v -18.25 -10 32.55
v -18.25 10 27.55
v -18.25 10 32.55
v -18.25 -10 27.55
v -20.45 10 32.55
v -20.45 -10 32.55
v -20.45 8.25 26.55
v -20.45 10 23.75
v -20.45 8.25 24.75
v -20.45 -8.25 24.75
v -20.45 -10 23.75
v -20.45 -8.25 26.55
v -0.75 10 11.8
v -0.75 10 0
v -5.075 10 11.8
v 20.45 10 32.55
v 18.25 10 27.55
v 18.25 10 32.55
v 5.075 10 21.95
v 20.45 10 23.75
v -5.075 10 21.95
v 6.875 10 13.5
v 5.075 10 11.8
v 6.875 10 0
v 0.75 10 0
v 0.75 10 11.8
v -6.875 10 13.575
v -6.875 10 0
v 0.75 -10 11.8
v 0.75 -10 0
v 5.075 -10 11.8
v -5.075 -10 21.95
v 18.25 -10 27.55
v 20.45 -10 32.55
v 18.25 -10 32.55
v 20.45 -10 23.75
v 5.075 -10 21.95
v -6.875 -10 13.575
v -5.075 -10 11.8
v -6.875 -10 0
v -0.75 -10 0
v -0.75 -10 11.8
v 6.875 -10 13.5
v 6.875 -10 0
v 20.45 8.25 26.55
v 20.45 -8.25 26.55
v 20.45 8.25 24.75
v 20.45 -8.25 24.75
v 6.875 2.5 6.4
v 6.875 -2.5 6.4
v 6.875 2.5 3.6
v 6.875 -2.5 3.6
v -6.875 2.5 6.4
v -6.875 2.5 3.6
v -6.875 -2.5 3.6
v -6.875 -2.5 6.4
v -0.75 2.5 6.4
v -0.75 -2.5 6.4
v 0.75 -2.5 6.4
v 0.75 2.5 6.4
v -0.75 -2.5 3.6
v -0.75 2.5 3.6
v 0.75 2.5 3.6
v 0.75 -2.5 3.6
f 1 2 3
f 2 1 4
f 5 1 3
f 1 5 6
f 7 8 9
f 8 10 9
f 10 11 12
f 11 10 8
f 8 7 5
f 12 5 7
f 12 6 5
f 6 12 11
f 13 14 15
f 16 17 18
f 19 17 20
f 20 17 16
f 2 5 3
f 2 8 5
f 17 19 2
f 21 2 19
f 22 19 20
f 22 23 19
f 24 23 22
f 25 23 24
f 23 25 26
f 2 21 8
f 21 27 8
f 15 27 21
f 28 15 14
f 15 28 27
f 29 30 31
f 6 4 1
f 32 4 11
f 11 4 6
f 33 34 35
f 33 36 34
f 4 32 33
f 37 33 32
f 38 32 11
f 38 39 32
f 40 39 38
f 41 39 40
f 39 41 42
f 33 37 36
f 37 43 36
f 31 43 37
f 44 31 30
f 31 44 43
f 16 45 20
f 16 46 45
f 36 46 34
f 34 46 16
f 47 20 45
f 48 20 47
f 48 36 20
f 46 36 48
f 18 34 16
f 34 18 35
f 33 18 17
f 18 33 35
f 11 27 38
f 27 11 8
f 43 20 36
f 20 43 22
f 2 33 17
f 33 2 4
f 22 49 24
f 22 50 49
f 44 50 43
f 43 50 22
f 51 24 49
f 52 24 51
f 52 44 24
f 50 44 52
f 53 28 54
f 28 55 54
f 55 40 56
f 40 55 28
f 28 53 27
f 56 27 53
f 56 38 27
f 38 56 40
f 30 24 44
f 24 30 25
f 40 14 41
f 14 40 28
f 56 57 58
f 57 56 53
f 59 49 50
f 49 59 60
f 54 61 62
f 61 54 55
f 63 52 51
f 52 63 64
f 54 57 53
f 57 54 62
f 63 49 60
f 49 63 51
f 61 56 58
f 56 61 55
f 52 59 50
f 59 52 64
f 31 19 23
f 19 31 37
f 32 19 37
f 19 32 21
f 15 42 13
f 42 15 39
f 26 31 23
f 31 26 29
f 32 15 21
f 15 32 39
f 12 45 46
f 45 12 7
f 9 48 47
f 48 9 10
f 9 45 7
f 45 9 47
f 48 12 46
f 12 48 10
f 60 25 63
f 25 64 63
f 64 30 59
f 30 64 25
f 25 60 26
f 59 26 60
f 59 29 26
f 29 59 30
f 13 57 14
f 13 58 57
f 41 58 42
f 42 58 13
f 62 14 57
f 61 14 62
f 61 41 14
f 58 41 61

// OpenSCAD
// ===================================================================
// Project: OpenStickFPV
// Component: Modular 2200mAh 3S Battery Saddle Mount (Print 2x: Front & Rear)
// - Fits standard 2200mAh 3S LiPo packs (~34-36mm wide; pocket set to 36.5mm)
// - 5.0mm tall side retaining walls keep the battery centered and prevent
//   lateral sliding during rolls and rough landings
// - Recessed Velcro battery strap pass-through slot underneath the tray
//   so the battery strap wraps cleanly around the pack & tray without
//   interfering with the 10x10mm carbon spar underneath
// - Spar Attachment: Mounts to 10x10mm carbon fiber spar using the same
//   flush 10mm upper extension with lateral zip-tie slot & compression slit
// - 20.0mm fore-aft length along the carbon rod (print 2 identical units)
// - Print Orientation: Print sideways (front or rear face flat on build plate)
//   for 100% support-free 3D printing
// ===================================================================

$fn = 50;

// --- Fuselage Spar Spec (10x10mm Square) ---
spar_width           = 10.15;  // 10x10mm spar (+0.15mm printer tolerance)
spar_height          = 10.15;  // 10x10mm spar height
sleeve_wall          = 1.8;    // Structural collar wall thickness
mount_length         = 20.0;   // Fore-aft length along the carbon rod (Y-axis)

// --- Zip-Tie Clamping System (Matches Landing Gear & Wing Mounts) ---
clamp_rise           = 10.0;   // Extension from collar for zip-tie slot
ziptie_slot_w        = 5.0;    // Slot width along fuselage (fits up to 4.8mm ties)
ziptie_slot_h        = 2.8;    // Slot vertical clearance (Z-axis)
pinch_slit_w         = 1.5;    // Longitudinal compression slit

// --- 2200mAh 3S Battery Tray & Side Walls ---
// Standard 2200mAh 3S LiPo is ~34-35mm wide; 36.5mm gives a snug fit with foam/velcro
battery_pocket_w     = 36.5;   // Clear inner width between side walls (X-axis)
side_wall_thick      = 2.2;    // Thickness of left/right retaining walls
side_wall_height     = 5.0;    // 5.0mm tall side walls to prevent battery sliding out
tray_floor_thick     = 3.8;    // Thick enough to house the Velcro strap slot underneath

// --- Velcro Battery Strap Pass-Through Slot ---
strap_slot_w         = 16.5;   // Fits standard 15mm-16mm wide LiPo Velcro straps
strap_slot_h         = 1.8;    // Vertical clearance for Velcro strap pass-through

// --- Gusset Termination Spec ---
// Terminates 3.5mm away from the collar clamping end so the leaves flex easily
gusset_flex_offset   = 3.5;

// Derived Dimensions
collar_w             = spar_width + 2 * sleeve_wall;        // ~13.75mm
collar_h             = spar_height + 2 * sleeve_wall;       // ~13.75mm
tray_total_w         = battery_pocket_w + 2 * side_wall_thick; // 40.9mm

// Vertical Stack (Z-axis: Tray on top of spar, zip-tie clamp hanging below spar)
// Note: Can also be mounted inverted (battery slung below spar) with zero changes
clamp_bot_z          = 0;
spar_collar_bot_z    = clamp_bot_z + clamp_rise;
spar_collar_top_z    = spar_collar_bot_z + collar_h;

tray_bot_z           = spar_collar_top_z;
tray_bed_z           = tray_bot_z + tray_floor_thick;
side_wall_top_z      = tray_bed_z + side_wall_height;

ziptie_z             = clamp_bot_z + clamp_rise / 2;
gusset_start_z       = spar_collar_bot_z + gusset_flex_offset;

module battery_mount_2200_3s() {
    difference() {
        // -------------------------------------------------------------
        // 1. ADDITIVE SHAPES
        // -------------------------------------------------------------
        union() {
            // A. Battery Tray Floor (40.9mm wide x 20.0mm long x 3.8mm thick)
            translate([-tray_total_w/2, -mount_length/2, tray_bot_z])
                cube([tray_total_w, mount_length, tray_floor_thick]);

            // B. Left (-X) & Right (+X) 5.0mm Battery Retaining Side Walls
            for (sx = [-1, 1]) {
                translate([
                    sx > 0 ? (battery_pocket_w/2) : (-tray_total_w/2),
                    -mount_length/2,
                    tray_bed_z - 0.1
                ])
                    cube([side_wall_thick, mount_length, side_wall_height + 0.1]);
            }

            // C. Central 10x10mm Spar Sleeve Core (20.0mm Length)
            translate([-collar_w/2, -mount_length/2, spar_collar_bot_z - 0.1])
                cube([collar_w, mount_length, collar_h + 0.2]);

            // D. Extended Zip-Tie Clamp Body (10mm extension, flush collar width)
            translate([-collar_w/2, -mount_length/2, clamp_bot_z])
                cube([collar_w, mount_length, clamp_rise + 0.1]);

            // E. Coplanar Diagonal Gussets (Flush with Front/Rear Faces at Y = +/- 10.0mm)
            // Supports the outboard battery tray edges while keeping front/rear faces
            // 100% flat for support-free sideways 3D printing
            for (sx = [-1, 1]) {
                hull() {
                    // Inner root on collar side wall (stops 3.5mm clear of flex zone)
                    translate([sx * (collar_w/2 - 0.1), -mount_length/2, gusset_start_z])
                        cube([0.1, mount_length, spar_collar_top_z - gusset_start_z]);

                    // Outer edge meeting the underside of the battery tray
                    translate([
                        sx > 0 ? (tray_total_w/2 - 0.1) : (-tray_total_w/2),
                        -mount_length/2,
                        tray_bot_z
                    ])
                        cube([0.1, mount_length, 0.1]);
                }
            }
        }

        // -------------------------------------------------------------
        // 2. 10x10mm CARBON SPAR CAVITY
        // -------------------------------------------------------------
        translate([-spar_width/2, -mount_length/2 - 1, spar_collar_bot_z + sleeve_wall])
            cube([spar_width, mount_length + 2, spar_height]);

        // -------------------------------------------------------------
        // 3. VELCRO BATTERY STRAP PASS-THROUGH SLOT (Under Tray Bed)
        // -------------------------------------------------------------
        // Allows a 15-16mm Velcro strap to pass laterally beneath the battery
        // without touching the carbon spar or gussets
        translate([0, 0, tray_bot_z + tray_floor_thick/2])
            cube([tray_total_w + 2, strap_slot_w, strap_slot_h], center = true);

        // -------------------------------------------------------------
        // 4. LATERAL ZIP-TIE SLOT (Spar Clamp)
        // -------------------------------------------------------------
        for (sx = [-1, 1]) {
            translate([sx * collar_w/4, 0, ziptie_z])
                cube([collar_w/2 + 2, ziptie_slot_w, ziptie_slot_h], center = true);
        }

        // -------------------------------------------------------------
        // 5. LONGITUDINAL COMPRESSION SLIT
        // -------------------------------------------------------------
        translate([-pinch_slit_w/2, -mount_length/2 - 1, clamp_bot_z - 1])
            cube([pinch_slit_w, mount_length + 2, clamp_rise + sleeve_wall + 1.2]);
    }
}

battery_mount_2200_3s();
